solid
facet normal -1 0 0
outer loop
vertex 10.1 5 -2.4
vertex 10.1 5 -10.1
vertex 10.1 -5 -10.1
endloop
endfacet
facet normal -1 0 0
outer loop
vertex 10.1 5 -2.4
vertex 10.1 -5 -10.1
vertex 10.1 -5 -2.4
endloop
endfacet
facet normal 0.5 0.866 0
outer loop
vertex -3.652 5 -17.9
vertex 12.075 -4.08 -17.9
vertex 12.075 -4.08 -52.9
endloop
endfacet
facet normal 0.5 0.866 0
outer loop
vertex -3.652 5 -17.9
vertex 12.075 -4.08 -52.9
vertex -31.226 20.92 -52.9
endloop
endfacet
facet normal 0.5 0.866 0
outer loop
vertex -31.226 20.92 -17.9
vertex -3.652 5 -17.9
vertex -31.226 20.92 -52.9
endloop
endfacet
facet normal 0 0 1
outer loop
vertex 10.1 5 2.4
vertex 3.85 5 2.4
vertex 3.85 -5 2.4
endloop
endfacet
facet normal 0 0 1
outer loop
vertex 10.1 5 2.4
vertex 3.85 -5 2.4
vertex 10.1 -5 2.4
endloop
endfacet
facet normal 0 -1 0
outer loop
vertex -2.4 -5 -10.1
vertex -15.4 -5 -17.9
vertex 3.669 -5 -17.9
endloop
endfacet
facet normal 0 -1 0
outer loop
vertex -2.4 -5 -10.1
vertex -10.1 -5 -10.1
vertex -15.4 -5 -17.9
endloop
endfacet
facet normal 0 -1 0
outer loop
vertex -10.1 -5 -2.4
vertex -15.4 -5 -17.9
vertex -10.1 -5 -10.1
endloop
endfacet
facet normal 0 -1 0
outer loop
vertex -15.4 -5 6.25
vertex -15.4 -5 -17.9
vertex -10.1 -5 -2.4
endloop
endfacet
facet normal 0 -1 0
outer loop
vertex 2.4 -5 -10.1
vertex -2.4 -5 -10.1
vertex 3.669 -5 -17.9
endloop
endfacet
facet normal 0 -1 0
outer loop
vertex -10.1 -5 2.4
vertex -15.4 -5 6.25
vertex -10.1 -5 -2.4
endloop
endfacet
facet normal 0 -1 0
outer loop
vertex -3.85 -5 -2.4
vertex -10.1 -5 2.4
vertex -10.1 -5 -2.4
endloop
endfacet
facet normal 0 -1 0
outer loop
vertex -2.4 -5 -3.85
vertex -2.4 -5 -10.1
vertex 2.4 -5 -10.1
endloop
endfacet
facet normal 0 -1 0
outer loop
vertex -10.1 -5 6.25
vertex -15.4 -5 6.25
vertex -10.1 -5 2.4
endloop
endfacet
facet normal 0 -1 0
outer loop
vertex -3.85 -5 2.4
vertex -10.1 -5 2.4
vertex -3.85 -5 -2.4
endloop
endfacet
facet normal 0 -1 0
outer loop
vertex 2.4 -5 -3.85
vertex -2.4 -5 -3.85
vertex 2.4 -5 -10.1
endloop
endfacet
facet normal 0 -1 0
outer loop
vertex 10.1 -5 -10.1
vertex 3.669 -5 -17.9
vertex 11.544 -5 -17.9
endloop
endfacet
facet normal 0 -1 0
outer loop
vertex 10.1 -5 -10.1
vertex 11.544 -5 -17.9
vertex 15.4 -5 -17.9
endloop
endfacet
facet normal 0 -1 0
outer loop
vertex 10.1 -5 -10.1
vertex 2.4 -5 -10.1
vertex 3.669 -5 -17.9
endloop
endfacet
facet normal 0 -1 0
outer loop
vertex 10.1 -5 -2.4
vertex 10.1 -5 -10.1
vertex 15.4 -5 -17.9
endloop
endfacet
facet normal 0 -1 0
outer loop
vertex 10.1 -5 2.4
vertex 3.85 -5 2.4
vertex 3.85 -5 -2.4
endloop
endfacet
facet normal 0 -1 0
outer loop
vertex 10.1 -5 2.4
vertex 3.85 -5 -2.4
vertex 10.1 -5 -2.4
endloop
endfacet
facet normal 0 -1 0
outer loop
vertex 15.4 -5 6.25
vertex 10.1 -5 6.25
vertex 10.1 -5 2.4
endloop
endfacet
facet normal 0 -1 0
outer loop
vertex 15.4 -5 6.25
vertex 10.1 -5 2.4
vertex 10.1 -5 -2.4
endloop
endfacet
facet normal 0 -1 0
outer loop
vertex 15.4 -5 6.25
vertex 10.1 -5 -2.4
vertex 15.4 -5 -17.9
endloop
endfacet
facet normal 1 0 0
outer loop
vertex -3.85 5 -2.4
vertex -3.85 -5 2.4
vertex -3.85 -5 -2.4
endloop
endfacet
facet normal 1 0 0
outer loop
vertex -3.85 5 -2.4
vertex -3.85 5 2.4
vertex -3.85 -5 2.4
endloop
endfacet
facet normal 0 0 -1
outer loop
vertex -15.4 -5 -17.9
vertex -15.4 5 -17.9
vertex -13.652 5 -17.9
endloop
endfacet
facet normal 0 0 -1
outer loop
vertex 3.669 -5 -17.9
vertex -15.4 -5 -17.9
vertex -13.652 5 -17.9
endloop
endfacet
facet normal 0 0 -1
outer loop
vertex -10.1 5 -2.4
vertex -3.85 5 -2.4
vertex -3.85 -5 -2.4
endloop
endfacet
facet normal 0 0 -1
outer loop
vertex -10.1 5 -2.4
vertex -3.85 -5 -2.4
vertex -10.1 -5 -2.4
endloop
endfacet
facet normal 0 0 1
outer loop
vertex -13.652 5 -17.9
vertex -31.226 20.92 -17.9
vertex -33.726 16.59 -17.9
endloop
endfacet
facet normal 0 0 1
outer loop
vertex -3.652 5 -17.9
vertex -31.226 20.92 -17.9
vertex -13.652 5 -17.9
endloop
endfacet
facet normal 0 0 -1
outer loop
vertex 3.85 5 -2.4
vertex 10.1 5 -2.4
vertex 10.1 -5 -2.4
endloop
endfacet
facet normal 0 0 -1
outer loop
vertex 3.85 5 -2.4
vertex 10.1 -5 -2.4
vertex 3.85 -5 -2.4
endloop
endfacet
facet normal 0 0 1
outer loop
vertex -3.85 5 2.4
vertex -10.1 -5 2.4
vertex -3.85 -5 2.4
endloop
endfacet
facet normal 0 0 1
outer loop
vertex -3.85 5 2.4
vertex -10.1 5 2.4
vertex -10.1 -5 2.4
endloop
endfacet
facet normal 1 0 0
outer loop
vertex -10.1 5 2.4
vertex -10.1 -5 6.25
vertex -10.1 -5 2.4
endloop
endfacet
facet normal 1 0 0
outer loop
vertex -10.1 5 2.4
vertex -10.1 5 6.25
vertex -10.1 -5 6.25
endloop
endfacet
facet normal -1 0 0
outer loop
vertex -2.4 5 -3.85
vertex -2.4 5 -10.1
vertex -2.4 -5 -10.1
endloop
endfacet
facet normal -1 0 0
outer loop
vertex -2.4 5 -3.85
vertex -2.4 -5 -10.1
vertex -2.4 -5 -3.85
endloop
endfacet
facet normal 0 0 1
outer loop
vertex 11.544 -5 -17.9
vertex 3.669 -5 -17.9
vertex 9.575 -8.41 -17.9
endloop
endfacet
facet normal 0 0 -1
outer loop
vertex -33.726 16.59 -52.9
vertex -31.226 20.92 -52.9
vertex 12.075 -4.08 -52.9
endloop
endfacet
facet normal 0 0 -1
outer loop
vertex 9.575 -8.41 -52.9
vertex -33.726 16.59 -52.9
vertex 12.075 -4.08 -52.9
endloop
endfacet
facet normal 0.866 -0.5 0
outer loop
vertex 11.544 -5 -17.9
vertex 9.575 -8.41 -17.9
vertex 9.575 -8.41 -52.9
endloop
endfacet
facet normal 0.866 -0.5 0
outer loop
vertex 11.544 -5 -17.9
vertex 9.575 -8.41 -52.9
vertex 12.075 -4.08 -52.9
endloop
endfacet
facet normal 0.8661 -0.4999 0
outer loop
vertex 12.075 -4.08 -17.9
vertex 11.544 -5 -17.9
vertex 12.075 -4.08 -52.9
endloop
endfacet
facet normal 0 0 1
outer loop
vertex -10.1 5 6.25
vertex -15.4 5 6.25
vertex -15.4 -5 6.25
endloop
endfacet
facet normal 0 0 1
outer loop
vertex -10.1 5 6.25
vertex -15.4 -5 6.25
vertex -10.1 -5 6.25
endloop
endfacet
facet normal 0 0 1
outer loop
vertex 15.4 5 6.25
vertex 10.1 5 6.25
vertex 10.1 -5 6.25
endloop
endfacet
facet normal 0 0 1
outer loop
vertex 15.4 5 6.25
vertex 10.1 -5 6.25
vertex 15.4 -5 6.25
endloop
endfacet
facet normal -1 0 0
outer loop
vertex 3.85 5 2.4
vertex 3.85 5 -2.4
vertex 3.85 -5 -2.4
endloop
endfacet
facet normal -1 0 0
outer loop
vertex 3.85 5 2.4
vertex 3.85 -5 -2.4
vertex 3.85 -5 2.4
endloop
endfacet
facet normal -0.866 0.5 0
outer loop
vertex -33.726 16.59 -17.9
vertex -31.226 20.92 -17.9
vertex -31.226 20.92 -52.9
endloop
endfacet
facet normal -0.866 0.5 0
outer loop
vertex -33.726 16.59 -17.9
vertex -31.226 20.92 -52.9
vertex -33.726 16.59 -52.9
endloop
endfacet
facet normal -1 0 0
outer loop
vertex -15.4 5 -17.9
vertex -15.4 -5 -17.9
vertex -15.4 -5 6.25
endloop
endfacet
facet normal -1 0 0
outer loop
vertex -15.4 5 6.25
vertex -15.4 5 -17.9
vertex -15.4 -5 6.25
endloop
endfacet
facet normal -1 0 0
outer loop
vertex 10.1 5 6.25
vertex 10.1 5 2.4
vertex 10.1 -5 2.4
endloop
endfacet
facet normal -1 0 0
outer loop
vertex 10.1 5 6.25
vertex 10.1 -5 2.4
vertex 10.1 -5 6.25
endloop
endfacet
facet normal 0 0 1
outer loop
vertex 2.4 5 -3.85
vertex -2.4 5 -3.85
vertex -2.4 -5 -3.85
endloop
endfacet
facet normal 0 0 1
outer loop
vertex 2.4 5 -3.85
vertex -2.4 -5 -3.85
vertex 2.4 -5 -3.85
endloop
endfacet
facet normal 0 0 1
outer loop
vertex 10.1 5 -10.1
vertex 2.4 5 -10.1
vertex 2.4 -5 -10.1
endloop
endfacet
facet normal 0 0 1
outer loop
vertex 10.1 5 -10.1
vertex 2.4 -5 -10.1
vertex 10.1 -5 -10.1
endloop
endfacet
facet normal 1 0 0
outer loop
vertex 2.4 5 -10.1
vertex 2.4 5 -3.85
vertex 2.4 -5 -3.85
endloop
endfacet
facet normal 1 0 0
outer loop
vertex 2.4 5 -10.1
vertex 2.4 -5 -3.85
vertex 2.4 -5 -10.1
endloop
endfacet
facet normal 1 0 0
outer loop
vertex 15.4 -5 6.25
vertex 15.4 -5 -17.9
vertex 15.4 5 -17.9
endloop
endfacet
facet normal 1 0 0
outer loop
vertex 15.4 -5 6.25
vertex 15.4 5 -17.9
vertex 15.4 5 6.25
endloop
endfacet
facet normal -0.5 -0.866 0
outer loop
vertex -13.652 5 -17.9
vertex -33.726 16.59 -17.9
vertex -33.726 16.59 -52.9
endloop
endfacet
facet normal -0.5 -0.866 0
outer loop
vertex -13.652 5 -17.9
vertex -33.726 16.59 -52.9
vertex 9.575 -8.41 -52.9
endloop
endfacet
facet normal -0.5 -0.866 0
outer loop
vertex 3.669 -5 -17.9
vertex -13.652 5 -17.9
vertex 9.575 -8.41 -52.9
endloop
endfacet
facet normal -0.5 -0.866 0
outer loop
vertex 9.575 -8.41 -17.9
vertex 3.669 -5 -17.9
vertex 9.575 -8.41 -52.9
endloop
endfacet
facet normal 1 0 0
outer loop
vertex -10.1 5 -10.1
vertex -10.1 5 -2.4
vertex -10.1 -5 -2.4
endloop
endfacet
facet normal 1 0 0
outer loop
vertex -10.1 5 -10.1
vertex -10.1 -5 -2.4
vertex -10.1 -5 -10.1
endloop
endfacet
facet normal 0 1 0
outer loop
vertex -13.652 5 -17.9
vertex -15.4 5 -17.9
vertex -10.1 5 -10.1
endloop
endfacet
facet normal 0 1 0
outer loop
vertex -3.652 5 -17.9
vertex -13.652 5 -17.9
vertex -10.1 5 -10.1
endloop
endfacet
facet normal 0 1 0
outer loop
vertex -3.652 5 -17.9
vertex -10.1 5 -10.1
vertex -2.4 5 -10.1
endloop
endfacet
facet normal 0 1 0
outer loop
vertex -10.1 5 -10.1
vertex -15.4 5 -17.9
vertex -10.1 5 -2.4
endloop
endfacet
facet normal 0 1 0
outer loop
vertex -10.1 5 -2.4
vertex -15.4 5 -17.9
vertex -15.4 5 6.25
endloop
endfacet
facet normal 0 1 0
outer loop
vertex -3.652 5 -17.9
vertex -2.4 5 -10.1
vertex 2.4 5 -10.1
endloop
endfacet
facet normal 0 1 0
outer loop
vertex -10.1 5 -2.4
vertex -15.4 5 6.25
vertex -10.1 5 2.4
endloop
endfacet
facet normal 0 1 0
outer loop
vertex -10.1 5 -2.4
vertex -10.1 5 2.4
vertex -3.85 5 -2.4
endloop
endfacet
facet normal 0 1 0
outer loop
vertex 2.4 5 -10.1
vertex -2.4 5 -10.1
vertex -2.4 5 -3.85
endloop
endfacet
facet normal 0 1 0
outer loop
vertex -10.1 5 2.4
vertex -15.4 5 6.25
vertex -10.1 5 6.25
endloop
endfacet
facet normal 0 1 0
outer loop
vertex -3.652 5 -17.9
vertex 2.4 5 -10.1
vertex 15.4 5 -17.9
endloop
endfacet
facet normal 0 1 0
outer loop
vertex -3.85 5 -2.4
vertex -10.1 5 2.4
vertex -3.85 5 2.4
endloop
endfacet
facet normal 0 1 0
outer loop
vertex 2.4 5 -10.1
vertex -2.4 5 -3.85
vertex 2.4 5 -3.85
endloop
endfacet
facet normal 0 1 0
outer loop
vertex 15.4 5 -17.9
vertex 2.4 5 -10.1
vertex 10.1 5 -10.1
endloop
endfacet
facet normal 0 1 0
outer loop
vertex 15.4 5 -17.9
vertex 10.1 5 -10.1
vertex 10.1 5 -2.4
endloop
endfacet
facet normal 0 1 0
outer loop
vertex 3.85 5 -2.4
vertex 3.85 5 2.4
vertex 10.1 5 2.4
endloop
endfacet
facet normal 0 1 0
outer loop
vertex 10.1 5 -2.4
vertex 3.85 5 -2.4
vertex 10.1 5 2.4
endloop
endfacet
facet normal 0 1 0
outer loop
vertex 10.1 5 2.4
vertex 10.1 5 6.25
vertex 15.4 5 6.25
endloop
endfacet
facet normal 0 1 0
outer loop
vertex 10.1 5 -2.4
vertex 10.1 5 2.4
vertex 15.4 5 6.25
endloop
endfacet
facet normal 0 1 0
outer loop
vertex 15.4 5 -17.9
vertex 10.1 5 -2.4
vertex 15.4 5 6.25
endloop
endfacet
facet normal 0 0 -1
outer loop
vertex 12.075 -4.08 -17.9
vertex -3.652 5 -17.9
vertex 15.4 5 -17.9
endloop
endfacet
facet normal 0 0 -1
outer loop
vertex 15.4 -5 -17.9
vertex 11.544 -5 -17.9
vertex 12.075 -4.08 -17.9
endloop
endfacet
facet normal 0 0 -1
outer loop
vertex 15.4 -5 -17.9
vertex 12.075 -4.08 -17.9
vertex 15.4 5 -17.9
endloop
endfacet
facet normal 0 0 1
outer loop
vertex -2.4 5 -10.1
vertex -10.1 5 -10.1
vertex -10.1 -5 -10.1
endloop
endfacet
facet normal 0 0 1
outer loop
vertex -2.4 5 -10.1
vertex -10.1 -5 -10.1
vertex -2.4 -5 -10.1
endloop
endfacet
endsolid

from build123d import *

# Parameters (mm, degrees)
BOSS_EXTRU_1_DEPTH = 5
ESQUISSE14_W       = 30.8
ESQUISSE14_H       = 2.5
BOSS_EXTRU_3_DEPTH = 10
BOSS_EXTRU_5_DEPTH = 35


with BuildPart() as part:
    # Base → Boss.-Extru.1 (new, symmetric)
    with BuildSketch(Plane(origin=(0, 0, 0), x_dir=(1, 0, 0), z_dir=(0, 1, 0))):
        Polygon((-3.85, -2.4), (-3.85, 2.4), (-10.1, 2.4), (-10.1, 10.1), (-2.4, 10.1), (-2.4, 3.85), (2.4, 3.85), (2.4, 10.1), (10.1, 10.1), (10.1, 2.4), (3.85, 2.4), (3.85, -2.4), (10.1, -2.4), (10.1, -6.25), (15.4, -6.25), (15.4, 15.4), (-15.4, 15.4), (-15.4, -6.25), (-10.1, -6.25), (-10.1, -2.4), align=None)
    extrude(amount=BOSS_EXTRU_1_DEPTH, both=True)

    # Esquisse14 → Boss.-Extru.3 (add)
    with BuildSketch(Plane.XZ.offset(5)):
        with Locations((0, -16.65)):
            Rectangle(ESQUISSE14_W, ESQUISSE14_H)
    extrude(amount=-BOSS_EXTRU_3_DEPTH)

    # Esquisse16 → Boss.-Extru.5 (add)
    with BuildSketch(Plane(origin=(0, 0, -17.9), x_dir=(-1, 0, 0), z_dir=(0, 0, -1))):
        Polygon((31.226270189, 20.920127019), (33.726270189, 16.59), (-9.575, -8.41), (-12.075, -4.079872981), align=None)
    extrude(amount=BOSS_EXTRU_5_DEPTH)


solid = part.part
